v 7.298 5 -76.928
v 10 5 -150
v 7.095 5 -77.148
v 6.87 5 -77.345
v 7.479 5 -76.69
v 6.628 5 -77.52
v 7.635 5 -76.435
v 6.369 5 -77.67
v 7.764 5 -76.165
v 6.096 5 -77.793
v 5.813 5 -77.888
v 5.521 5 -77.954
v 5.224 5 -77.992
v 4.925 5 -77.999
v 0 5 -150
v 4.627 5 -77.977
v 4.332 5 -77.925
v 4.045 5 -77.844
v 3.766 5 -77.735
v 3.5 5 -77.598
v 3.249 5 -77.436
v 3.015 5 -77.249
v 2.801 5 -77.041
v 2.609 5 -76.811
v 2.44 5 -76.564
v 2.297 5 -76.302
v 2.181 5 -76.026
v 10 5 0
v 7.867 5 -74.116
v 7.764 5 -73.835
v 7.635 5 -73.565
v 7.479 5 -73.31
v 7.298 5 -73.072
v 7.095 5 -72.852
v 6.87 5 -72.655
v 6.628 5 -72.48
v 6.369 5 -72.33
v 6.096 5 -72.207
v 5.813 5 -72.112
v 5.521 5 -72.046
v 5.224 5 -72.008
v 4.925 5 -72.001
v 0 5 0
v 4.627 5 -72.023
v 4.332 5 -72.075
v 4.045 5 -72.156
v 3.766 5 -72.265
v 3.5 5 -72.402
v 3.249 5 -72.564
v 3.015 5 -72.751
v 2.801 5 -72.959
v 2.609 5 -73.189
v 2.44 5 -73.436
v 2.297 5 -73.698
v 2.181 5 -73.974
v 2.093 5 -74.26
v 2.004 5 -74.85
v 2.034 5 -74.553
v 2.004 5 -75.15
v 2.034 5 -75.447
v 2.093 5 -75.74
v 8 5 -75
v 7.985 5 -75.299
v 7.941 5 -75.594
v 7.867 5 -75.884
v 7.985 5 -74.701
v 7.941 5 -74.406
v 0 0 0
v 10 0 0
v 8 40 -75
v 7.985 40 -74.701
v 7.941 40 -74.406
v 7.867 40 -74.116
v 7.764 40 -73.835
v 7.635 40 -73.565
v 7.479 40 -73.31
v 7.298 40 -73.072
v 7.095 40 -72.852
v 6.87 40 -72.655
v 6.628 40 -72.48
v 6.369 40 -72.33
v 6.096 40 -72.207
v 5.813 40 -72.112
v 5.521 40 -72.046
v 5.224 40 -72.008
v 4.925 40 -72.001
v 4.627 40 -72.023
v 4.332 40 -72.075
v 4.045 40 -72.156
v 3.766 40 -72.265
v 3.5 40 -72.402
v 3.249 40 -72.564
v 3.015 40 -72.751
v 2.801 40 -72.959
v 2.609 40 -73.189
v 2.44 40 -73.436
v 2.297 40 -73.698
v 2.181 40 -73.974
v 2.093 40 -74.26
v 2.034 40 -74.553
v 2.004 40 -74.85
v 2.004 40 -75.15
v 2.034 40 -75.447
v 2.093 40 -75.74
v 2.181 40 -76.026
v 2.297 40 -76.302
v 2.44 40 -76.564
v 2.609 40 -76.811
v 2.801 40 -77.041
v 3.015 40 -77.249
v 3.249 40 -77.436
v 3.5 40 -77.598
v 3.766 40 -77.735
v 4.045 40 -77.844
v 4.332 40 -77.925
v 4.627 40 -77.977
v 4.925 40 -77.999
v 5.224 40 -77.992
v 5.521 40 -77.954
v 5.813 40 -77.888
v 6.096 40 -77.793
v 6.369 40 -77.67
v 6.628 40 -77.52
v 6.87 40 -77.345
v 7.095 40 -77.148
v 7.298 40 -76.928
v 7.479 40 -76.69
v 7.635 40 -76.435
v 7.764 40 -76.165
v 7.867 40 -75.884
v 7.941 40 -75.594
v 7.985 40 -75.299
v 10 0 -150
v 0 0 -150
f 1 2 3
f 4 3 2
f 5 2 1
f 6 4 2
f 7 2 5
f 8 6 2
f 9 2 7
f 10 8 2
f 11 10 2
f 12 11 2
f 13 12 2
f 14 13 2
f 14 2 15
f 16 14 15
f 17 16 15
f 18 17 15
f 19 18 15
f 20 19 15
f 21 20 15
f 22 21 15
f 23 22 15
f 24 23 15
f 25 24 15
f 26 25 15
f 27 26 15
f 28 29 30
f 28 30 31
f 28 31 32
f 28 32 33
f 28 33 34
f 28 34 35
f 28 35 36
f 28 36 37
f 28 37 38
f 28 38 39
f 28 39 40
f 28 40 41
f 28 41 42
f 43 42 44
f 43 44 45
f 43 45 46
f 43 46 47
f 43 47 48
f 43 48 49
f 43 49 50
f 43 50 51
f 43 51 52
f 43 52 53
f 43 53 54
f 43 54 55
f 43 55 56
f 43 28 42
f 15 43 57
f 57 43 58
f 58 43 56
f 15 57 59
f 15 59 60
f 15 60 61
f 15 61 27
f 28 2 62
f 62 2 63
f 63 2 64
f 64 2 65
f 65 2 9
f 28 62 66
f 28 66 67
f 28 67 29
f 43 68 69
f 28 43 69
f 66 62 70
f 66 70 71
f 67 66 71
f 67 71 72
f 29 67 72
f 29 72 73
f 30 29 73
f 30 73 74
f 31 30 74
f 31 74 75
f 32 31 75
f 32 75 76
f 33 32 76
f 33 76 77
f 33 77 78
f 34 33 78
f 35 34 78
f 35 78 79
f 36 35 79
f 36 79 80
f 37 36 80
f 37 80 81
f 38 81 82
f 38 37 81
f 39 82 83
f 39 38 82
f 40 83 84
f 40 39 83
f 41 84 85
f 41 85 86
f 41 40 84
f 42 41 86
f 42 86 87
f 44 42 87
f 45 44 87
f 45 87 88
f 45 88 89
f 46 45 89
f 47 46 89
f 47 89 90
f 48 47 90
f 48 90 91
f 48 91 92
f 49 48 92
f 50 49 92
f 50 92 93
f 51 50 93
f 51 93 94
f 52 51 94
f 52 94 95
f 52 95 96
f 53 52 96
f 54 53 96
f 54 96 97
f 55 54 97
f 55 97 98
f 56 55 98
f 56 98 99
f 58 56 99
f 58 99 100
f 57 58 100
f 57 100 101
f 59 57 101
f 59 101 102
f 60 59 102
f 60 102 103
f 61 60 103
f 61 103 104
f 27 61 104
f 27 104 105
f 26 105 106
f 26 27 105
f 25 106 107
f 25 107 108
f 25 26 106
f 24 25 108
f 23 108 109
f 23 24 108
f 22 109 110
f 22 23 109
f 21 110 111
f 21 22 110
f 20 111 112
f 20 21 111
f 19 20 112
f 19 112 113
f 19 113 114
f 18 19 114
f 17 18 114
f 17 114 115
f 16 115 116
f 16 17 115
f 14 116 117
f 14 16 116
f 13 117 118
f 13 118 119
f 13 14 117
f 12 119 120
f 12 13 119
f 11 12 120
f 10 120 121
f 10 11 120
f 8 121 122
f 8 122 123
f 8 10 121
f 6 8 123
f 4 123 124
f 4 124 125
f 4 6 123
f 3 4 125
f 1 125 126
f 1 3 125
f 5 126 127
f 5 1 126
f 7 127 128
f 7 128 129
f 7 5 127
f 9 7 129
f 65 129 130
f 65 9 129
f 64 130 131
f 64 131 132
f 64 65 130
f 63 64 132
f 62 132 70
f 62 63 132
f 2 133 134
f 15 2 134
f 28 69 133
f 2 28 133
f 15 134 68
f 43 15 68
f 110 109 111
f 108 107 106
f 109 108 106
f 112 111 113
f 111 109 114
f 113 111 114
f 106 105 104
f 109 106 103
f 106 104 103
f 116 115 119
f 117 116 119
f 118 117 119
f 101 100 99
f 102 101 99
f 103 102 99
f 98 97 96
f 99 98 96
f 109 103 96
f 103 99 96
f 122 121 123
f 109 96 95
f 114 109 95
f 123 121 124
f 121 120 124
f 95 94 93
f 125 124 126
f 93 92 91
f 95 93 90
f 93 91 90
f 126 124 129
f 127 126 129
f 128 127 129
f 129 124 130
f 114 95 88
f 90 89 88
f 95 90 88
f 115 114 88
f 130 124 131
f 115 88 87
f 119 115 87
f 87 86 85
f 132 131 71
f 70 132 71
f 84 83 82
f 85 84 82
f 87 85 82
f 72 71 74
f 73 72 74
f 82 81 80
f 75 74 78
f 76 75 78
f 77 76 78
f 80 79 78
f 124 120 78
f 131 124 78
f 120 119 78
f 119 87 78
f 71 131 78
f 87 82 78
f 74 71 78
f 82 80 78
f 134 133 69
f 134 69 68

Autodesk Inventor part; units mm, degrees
ref_plane "YZ Plane" through (0, 0, 0) normal (1, 0, 0) x (0, 1, 0)
ref_plane "XZ Plane" through (0, 0, 0) normal (0, 1, 0) x (-1, 0, 0)
ref_plane "XY Plane" through (0, 0, 0) normal (0, 0, 1) x (1, 0, 0)
sketch "Sketch1" plane through (0, 0, 0) normal (0, 1, 0) x (-1, 0, 0)
  line L0 (0, 0) -> (-10, 0)
  line L1 (-10, 0) -> (-10, -150)
  line L2 (-10, -150) -> (0, -150)
  line L3 (0, -150) -> (0, 0)
  circle A0 centre (-5, -75) radius 3
  dimension "d0" = 10
  dimension "d1" = 150
  dimension "d2" = 6
  dimension "d5" = 75
extrude "Extrusion1" add sketch "Sketch1" along normal blind 5
sketch "Sketch2" plane through (0, 0, 0) normal (0, -1, 0) x (1, 0, 0)
  circle A0 centre (5, -75) radius 3
  point P0 (0, 0)
extrude "Extrusion2" add sketch "Sketch2" against normal blind 40
properties part number "enganche vertical rueda gusano"
